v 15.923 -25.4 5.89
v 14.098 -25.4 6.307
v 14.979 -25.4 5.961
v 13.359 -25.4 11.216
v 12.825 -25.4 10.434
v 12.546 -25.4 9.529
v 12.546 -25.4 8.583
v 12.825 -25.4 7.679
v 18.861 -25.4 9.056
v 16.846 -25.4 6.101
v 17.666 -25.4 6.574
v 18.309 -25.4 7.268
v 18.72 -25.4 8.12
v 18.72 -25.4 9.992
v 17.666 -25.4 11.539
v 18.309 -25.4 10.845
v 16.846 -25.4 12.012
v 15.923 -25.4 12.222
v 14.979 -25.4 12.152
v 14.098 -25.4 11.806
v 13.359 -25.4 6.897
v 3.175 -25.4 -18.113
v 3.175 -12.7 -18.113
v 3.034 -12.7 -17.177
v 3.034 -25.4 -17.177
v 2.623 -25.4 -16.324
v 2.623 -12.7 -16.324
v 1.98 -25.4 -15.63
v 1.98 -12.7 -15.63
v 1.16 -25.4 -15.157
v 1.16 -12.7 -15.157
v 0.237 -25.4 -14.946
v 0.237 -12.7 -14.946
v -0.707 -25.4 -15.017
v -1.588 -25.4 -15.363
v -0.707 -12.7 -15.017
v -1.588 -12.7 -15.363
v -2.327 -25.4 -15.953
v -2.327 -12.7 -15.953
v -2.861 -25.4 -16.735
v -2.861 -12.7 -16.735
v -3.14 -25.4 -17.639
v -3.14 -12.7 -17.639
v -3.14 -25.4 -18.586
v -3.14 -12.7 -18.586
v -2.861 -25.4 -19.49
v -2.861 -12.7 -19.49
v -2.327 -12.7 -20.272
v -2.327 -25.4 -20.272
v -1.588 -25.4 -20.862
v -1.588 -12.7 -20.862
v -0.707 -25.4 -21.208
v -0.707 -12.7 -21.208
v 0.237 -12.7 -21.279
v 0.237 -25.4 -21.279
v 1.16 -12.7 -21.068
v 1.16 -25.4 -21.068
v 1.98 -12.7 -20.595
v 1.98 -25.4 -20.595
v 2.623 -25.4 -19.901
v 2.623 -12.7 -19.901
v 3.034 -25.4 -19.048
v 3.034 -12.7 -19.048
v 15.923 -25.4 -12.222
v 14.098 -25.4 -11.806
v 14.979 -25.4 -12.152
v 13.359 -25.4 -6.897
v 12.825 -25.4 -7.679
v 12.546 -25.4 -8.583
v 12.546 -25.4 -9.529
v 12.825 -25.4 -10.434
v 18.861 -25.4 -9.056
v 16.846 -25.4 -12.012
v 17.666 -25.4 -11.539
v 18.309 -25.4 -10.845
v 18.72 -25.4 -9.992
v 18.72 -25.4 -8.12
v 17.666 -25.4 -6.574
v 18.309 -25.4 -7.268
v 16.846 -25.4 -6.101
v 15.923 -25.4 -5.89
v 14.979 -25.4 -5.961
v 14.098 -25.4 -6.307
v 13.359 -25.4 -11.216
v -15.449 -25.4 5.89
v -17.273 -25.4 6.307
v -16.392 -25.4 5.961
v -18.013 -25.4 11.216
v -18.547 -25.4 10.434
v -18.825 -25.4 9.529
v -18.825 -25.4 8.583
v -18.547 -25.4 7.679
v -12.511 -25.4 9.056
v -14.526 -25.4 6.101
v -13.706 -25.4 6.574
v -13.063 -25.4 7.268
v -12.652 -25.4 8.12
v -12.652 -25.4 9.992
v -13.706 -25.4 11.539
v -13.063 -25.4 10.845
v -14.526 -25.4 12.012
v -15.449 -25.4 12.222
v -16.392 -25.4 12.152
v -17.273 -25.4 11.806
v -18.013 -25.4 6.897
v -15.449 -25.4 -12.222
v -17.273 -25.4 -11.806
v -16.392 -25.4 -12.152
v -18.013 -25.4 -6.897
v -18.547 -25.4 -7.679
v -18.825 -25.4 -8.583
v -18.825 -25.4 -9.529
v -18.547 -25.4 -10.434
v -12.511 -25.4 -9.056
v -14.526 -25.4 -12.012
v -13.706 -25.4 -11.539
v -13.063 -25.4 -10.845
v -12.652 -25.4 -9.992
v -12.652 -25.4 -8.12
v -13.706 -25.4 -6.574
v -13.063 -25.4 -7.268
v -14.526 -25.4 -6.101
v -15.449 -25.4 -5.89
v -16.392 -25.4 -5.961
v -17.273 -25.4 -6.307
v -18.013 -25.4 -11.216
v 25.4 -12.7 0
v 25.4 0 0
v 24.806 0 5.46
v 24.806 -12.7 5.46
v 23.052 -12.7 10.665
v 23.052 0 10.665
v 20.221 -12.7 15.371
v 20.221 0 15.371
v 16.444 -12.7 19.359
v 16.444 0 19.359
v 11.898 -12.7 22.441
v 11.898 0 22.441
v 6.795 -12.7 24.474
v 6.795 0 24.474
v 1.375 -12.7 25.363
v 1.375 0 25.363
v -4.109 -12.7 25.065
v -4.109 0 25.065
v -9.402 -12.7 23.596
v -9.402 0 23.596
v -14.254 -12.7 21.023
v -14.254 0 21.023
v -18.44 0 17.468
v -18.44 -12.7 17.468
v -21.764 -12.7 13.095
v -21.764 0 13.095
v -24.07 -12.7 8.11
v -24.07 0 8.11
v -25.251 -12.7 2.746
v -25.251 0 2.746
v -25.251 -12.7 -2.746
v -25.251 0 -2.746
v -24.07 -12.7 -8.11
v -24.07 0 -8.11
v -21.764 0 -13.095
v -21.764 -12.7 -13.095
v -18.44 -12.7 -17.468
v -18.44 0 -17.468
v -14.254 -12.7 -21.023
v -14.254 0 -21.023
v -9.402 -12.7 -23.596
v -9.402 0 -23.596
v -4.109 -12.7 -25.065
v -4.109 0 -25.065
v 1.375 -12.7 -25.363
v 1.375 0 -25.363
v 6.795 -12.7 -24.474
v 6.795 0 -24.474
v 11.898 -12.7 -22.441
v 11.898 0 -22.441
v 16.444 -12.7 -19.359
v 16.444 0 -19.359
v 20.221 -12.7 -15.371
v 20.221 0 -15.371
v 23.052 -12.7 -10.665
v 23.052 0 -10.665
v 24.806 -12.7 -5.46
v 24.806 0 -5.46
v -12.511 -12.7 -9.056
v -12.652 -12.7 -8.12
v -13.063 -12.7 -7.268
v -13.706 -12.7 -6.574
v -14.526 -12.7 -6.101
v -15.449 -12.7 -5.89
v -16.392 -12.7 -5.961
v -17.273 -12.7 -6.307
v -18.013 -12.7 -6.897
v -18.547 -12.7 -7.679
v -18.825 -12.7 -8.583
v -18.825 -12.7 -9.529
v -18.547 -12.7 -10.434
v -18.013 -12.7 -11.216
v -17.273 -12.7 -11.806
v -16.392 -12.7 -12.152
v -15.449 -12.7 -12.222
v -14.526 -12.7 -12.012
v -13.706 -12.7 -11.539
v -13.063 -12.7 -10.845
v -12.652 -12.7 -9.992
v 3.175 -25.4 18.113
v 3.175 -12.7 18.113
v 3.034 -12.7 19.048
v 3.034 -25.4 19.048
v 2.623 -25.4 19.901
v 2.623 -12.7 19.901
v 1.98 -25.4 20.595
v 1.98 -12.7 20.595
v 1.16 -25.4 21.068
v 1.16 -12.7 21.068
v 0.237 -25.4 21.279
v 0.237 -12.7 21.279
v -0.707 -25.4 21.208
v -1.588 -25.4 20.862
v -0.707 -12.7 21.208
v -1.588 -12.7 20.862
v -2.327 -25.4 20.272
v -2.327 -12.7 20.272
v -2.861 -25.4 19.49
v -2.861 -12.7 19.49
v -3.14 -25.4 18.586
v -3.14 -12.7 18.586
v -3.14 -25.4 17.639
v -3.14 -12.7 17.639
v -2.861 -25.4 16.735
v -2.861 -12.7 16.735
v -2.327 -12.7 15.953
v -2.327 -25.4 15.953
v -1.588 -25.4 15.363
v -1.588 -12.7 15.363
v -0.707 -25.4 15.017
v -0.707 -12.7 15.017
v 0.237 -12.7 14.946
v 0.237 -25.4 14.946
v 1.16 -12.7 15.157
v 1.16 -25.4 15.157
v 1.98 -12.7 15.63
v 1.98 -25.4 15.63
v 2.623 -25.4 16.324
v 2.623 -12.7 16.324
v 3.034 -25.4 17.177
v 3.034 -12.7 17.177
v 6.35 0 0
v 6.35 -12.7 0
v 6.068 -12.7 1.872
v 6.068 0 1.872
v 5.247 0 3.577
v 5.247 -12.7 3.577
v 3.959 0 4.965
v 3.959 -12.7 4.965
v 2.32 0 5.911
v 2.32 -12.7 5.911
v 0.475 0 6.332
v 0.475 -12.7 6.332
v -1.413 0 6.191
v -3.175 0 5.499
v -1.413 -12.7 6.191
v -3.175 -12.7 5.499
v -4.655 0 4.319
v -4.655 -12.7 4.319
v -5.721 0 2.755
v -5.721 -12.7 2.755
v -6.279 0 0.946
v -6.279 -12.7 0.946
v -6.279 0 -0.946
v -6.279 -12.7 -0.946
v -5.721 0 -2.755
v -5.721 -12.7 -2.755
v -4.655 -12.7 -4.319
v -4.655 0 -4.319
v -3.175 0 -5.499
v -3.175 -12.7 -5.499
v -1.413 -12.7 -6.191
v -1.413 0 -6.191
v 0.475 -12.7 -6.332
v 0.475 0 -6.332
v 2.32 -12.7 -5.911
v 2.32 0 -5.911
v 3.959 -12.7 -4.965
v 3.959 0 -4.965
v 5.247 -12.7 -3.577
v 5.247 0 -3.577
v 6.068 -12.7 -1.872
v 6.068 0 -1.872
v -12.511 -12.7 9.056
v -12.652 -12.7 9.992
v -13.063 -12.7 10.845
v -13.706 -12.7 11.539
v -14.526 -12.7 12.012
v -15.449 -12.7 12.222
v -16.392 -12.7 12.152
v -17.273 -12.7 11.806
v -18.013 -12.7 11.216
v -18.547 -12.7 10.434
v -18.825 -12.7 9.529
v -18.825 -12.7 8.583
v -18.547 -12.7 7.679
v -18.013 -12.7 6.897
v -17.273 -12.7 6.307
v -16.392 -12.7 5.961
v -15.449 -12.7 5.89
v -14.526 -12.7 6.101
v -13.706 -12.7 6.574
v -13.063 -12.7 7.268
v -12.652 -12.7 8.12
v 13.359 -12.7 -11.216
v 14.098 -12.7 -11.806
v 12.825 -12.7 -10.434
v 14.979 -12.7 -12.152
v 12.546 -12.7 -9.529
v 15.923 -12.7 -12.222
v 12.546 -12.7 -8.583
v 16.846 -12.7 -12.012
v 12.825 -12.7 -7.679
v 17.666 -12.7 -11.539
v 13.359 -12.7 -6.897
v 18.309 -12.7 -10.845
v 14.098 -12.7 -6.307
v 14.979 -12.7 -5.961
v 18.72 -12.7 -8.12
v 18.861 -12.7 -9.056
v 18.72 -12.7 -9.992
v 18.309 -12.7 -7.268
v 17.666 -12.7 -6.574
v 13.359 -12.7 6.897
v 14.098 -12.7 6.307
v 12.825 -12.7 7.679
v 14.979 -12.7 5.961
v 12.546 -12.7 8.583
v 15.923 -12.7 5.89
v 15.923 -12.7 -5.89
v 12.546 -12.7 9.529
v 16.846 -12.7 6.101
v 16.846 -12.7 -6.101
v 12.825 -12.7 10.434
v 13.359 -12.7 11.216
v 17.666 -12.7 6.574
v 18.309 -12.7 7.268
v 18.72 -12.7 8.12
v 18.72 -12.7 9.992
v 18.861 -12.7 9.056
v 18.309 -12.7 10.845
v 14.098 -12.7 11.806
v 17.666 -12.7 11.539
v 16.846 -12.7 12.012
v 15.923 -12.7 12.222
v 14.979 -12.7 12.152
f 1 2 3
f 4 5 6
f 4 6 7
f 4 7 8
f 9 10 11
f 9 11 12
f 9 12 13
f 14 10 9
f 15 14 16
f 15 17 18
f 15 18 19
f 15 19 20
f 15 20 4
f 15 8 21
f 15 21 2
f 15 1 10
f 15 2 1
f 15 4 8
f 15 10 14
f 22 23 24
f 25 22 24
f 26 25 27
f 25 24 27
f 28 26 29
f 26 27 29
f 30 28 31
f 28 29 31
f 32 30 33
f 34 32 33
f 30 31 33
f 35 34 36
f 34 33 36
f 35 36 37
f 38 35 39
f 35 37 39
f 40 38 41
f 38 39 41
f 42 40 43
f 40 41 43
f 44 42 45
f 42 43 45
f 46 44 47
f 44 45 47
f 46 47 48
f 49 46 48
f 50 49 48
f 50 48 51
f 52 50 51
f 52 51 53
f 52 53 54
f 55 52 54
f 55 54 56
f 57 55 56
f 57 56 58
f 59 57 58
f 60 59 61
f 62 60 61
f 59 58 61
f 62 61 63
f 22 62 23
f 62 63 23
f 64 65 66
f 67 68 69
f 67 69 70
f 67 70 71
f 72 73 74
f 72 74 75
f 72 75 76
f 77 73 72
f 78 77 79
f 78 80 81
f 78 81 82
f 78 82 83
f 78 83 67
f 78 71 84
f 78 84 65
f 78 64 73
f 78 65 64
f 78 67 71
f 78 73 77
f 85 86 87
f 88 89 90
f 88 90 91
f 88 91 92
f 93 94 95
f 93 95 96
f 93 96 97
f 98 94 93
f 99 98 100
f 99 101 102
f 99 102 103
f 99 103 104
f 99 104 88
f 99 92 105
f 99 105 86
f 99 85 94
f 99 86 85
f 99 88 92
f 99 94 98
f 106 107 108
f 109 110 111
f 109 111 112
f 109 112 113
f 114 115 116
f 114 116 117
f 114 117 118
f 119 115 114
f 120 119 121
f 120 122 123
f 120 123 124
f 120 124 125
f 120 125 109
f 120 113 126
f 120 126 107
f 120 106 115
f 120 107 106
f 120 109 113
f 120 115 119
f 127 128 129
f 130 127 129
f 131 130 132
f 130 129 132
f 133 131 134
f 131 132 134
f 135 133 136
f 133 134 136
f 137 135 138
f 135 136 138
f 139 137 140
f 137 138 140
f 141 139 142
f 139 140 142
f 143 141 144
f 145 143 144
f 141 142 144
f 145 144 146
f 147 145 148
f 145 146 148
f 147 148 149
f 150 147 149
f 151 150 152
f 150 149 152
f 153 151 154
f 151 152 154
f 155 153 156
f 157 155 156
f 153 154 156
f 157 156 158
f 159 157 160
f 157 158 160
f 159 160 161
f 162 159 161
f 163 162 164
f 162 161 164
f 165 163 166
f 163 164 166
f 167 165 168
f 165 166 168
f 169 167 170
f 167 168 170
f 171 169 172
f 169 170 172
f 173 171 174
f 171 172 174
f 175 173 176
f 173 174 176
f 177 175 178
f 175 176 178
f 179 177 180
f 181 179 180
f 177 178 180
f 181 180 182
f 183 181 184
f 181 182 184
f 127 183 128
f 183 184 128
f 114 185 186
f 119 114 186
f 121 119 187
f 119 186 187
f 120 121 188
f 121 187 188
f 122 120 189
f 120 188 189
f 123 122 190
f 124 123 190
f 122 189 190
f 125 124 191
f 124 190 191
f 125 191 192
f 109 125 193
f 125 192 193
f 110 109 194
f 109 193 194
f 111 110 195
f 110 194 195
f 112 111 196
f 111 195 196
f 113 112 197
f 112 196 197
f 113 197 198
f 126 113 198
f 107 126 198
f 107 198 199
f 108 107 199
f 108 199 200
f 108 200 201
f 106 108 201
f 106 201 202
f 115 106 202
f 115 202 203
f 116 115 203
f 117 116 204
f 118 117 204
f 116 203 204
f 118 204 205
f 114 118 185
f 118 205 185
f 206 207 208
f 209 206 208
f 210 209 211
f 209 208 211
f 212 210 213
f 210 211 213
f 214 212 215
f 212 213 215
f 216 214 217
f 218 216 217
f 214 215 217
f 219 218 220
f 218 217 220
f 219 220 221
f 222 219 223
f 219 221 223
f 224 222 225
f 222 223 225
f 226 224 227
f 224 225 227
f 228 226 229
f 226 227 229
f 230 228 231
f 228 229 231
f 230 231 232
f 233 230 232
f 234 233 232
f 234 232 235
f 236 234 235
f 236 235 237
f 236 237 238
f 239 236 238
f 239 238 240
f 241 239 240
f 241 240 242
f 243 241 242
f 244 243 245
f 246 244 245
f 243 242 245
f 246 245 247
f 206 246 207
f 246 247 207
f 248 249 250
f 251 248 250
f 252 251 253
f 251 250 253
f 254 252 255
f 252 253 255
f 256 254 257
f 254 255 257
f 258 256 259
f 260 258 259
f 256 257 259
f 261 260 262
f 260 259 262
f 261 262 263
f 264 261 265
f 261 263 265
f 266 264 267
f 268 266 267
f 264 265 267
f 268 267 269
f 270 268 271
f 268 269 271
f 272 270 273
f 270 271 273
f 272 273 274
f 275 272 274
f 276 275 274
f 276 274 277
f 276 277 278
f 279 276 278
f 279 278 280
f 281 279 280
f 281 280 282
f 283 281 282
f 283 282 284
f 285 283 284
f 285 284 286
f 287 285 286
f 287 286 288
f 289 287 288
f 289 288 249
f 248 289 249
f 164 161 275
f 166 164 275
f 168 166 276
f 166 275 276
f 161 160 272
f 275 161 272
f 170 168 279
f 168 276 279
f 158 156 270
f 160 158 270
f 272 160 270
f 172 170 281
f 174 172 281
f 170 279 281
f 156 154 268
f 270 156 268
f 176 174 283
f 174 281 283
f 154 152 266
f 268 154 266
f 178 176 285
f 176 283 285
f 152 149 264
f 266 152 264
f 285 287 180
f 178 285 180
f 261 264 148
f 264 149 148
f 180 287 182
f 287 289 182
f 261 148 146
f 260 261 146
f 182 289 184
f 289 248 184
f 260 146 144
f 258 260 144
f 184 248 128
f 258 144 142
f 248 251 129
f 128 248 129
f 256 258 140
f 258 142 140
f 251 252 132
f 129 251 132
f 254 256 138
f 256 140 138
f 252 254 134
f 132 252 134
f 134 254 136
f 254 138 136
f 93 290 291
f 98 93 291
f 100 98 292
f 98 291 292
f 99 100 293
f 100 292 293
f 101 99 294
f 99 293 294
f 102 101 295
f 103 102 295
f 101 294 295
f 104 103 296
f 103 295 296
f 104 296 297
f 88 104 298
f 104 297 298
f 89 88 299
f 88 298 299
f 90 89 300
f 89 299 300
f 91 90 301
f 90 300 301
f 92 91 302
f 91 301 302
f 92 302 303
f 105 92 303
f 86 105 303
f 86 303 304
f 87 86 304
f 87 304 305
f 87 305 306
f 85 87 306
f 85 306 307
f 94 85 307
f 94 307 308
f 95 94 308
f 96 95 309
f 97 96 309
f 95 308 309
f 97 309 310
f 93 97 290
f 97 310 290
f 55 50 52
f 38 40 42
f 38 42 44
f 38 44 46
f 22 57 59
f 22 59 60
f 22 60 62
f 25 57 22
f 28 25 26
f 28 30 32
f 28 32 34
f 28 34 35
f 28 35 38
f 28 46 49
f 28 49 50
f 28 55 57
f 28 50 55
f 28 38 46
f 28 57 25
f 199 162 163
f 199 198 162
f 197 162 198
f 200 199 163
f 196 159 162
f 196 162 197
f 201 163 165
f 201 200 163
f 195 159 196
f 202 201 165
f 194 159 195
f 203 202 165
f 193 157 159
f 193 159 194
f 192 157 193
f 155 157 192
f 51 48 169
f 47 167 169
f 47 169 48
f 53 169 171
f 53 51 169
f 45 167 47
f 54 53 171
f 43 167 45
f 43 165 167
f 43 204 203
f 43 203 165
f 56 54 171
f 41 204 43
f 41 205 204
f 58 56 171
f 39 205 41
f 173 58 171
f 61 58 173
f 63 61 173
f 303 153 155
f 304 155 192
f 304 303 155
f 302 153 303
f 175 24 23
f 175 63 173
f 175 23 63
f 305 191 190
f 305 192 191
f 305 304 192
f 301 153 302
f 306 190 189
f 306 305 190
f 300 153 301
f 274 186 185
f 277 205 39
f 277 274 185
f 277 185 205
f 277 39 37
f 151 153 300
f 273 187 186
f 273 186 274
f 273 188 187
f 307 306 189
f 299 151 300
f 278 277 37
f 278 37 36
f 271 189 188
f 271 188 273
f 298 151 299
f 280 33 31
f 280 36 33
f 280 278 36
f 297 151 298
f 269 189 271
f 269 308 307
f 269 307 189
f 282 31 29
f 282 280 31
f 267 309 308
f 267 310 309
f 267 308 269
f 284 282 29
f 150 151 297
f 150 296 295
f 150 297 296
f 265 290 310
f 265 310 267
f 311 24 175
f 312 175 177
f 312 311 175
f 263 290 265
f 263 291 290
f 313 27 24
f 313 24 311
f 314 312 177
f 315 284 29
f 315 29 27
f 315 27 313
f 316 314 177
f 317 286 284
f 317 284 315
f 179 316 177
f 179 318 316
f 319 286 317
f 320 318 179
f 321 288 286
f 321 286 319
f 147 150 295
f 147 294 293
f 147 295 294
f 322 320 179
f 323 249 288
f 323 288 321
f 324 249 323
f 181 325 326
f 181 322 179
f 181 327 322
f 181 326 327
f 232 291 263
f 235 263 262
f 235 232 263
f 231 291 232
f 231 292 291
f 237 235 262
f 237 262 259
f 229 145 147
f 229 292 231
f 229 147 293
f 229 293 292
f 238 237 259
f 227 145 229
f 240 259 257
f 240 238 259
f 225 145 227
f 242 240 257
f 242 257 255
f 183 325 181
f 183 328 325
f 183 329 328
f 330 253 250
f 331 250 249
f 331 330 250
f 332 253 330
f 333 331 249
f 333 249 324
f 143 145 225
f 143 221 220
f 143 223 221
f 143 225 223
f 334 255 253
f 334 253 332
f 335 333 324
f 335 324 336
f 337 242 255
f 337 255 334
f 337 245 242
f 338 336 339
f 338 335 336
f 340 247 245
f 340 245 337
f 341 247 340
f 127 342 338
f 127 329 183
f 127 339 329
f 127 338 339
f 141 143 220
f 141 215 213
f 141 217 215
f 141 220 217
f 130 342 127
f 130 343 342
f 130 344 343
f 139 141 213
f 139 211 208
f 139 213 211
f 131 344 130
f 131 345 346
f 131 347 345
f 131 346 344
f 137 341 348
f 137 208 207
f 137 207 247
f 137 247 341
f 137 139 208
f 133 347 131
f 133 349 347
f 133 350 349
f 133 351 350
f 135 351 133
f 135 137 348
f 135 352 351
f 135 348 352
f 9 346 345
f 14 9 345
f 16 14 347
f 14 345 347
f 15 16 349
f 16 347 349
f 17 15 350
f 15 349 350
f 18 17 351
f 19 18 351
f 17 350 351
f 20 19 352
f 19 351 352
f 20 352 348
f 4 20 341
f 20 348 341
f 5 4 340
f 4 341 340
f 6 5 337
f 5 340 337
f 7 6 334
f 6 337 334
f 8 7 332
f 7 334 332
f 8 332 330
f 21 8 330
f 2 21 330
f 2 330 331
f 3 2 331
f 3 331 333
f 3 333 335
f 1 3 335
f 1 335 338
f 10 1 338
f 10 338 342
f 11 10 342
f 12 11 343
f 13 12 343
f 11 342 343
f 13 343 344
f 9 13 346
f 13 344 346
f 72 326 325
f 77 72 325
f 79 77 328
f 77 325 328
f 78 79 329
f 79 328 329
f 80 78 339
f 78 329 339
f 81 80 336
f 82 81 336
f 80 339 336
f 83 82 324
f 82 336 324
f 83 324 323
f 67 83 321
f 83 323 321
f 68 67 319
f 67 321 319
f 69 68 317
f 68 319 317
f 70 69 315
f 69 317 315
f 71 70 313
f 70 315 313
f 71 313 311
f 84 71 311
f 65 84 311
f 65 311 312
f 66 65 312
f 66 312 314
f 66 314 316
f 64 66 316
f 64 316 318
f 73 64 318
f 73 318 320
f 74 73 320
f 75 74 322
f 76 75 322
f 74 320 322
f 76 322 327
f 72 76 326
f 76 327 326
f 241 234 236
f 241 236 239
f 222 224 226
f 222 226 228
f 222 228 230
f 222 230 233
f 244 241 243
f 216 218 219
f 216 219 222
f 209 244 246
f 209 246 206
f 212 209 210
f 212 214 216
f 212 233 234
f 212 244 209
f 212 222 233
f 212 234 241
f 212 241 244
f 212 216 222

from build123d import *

# Parameters (mm, degrees)
F0_R     = 25.4
F1_DEPTH = 12.7
F2_R     = 6.35
F3_DEPTH = 50.8
F4_R     = 3.175
F5_DEPTH = 12.7


with BuildPart() as f1:
    # F0 (on Front) → F1 (new body)
    with BuildSketch(Plane.XZ):
        Circle(F0_R)
    extrude(amount=F1_DEPTH)

    # F2 (on face) → F3 (cut)
    with BuildSketch(Plane.XZ.offset(12.7)):
        Circle(F2_R)
    extrude(amount=-F3_DEPTH, mode=Mode.SUBTRACT)

    # F4 (on face) → F5 (join)
    with BuildSketch(Plane.XZ.offset(12.7)):
        with Locations((0, 18.11257)):
            Circle(F4_R)
        with Locations((-15.685946, 9.056285)):
            Circle(F4_R)
        with Locations((-15.685946, -9.056285)):
            Circle(F4_R)
        with Locations((0, -18.11257)):
            Circle(F4_R)
        with Locations((15.685946, -9.056285)):
            Circle(F4_R)
        with Locations((15.685946, 9.056285)):
            Circle(F4_R)
    extrude(amount=F5_DEPTH)


solid = f1.part
